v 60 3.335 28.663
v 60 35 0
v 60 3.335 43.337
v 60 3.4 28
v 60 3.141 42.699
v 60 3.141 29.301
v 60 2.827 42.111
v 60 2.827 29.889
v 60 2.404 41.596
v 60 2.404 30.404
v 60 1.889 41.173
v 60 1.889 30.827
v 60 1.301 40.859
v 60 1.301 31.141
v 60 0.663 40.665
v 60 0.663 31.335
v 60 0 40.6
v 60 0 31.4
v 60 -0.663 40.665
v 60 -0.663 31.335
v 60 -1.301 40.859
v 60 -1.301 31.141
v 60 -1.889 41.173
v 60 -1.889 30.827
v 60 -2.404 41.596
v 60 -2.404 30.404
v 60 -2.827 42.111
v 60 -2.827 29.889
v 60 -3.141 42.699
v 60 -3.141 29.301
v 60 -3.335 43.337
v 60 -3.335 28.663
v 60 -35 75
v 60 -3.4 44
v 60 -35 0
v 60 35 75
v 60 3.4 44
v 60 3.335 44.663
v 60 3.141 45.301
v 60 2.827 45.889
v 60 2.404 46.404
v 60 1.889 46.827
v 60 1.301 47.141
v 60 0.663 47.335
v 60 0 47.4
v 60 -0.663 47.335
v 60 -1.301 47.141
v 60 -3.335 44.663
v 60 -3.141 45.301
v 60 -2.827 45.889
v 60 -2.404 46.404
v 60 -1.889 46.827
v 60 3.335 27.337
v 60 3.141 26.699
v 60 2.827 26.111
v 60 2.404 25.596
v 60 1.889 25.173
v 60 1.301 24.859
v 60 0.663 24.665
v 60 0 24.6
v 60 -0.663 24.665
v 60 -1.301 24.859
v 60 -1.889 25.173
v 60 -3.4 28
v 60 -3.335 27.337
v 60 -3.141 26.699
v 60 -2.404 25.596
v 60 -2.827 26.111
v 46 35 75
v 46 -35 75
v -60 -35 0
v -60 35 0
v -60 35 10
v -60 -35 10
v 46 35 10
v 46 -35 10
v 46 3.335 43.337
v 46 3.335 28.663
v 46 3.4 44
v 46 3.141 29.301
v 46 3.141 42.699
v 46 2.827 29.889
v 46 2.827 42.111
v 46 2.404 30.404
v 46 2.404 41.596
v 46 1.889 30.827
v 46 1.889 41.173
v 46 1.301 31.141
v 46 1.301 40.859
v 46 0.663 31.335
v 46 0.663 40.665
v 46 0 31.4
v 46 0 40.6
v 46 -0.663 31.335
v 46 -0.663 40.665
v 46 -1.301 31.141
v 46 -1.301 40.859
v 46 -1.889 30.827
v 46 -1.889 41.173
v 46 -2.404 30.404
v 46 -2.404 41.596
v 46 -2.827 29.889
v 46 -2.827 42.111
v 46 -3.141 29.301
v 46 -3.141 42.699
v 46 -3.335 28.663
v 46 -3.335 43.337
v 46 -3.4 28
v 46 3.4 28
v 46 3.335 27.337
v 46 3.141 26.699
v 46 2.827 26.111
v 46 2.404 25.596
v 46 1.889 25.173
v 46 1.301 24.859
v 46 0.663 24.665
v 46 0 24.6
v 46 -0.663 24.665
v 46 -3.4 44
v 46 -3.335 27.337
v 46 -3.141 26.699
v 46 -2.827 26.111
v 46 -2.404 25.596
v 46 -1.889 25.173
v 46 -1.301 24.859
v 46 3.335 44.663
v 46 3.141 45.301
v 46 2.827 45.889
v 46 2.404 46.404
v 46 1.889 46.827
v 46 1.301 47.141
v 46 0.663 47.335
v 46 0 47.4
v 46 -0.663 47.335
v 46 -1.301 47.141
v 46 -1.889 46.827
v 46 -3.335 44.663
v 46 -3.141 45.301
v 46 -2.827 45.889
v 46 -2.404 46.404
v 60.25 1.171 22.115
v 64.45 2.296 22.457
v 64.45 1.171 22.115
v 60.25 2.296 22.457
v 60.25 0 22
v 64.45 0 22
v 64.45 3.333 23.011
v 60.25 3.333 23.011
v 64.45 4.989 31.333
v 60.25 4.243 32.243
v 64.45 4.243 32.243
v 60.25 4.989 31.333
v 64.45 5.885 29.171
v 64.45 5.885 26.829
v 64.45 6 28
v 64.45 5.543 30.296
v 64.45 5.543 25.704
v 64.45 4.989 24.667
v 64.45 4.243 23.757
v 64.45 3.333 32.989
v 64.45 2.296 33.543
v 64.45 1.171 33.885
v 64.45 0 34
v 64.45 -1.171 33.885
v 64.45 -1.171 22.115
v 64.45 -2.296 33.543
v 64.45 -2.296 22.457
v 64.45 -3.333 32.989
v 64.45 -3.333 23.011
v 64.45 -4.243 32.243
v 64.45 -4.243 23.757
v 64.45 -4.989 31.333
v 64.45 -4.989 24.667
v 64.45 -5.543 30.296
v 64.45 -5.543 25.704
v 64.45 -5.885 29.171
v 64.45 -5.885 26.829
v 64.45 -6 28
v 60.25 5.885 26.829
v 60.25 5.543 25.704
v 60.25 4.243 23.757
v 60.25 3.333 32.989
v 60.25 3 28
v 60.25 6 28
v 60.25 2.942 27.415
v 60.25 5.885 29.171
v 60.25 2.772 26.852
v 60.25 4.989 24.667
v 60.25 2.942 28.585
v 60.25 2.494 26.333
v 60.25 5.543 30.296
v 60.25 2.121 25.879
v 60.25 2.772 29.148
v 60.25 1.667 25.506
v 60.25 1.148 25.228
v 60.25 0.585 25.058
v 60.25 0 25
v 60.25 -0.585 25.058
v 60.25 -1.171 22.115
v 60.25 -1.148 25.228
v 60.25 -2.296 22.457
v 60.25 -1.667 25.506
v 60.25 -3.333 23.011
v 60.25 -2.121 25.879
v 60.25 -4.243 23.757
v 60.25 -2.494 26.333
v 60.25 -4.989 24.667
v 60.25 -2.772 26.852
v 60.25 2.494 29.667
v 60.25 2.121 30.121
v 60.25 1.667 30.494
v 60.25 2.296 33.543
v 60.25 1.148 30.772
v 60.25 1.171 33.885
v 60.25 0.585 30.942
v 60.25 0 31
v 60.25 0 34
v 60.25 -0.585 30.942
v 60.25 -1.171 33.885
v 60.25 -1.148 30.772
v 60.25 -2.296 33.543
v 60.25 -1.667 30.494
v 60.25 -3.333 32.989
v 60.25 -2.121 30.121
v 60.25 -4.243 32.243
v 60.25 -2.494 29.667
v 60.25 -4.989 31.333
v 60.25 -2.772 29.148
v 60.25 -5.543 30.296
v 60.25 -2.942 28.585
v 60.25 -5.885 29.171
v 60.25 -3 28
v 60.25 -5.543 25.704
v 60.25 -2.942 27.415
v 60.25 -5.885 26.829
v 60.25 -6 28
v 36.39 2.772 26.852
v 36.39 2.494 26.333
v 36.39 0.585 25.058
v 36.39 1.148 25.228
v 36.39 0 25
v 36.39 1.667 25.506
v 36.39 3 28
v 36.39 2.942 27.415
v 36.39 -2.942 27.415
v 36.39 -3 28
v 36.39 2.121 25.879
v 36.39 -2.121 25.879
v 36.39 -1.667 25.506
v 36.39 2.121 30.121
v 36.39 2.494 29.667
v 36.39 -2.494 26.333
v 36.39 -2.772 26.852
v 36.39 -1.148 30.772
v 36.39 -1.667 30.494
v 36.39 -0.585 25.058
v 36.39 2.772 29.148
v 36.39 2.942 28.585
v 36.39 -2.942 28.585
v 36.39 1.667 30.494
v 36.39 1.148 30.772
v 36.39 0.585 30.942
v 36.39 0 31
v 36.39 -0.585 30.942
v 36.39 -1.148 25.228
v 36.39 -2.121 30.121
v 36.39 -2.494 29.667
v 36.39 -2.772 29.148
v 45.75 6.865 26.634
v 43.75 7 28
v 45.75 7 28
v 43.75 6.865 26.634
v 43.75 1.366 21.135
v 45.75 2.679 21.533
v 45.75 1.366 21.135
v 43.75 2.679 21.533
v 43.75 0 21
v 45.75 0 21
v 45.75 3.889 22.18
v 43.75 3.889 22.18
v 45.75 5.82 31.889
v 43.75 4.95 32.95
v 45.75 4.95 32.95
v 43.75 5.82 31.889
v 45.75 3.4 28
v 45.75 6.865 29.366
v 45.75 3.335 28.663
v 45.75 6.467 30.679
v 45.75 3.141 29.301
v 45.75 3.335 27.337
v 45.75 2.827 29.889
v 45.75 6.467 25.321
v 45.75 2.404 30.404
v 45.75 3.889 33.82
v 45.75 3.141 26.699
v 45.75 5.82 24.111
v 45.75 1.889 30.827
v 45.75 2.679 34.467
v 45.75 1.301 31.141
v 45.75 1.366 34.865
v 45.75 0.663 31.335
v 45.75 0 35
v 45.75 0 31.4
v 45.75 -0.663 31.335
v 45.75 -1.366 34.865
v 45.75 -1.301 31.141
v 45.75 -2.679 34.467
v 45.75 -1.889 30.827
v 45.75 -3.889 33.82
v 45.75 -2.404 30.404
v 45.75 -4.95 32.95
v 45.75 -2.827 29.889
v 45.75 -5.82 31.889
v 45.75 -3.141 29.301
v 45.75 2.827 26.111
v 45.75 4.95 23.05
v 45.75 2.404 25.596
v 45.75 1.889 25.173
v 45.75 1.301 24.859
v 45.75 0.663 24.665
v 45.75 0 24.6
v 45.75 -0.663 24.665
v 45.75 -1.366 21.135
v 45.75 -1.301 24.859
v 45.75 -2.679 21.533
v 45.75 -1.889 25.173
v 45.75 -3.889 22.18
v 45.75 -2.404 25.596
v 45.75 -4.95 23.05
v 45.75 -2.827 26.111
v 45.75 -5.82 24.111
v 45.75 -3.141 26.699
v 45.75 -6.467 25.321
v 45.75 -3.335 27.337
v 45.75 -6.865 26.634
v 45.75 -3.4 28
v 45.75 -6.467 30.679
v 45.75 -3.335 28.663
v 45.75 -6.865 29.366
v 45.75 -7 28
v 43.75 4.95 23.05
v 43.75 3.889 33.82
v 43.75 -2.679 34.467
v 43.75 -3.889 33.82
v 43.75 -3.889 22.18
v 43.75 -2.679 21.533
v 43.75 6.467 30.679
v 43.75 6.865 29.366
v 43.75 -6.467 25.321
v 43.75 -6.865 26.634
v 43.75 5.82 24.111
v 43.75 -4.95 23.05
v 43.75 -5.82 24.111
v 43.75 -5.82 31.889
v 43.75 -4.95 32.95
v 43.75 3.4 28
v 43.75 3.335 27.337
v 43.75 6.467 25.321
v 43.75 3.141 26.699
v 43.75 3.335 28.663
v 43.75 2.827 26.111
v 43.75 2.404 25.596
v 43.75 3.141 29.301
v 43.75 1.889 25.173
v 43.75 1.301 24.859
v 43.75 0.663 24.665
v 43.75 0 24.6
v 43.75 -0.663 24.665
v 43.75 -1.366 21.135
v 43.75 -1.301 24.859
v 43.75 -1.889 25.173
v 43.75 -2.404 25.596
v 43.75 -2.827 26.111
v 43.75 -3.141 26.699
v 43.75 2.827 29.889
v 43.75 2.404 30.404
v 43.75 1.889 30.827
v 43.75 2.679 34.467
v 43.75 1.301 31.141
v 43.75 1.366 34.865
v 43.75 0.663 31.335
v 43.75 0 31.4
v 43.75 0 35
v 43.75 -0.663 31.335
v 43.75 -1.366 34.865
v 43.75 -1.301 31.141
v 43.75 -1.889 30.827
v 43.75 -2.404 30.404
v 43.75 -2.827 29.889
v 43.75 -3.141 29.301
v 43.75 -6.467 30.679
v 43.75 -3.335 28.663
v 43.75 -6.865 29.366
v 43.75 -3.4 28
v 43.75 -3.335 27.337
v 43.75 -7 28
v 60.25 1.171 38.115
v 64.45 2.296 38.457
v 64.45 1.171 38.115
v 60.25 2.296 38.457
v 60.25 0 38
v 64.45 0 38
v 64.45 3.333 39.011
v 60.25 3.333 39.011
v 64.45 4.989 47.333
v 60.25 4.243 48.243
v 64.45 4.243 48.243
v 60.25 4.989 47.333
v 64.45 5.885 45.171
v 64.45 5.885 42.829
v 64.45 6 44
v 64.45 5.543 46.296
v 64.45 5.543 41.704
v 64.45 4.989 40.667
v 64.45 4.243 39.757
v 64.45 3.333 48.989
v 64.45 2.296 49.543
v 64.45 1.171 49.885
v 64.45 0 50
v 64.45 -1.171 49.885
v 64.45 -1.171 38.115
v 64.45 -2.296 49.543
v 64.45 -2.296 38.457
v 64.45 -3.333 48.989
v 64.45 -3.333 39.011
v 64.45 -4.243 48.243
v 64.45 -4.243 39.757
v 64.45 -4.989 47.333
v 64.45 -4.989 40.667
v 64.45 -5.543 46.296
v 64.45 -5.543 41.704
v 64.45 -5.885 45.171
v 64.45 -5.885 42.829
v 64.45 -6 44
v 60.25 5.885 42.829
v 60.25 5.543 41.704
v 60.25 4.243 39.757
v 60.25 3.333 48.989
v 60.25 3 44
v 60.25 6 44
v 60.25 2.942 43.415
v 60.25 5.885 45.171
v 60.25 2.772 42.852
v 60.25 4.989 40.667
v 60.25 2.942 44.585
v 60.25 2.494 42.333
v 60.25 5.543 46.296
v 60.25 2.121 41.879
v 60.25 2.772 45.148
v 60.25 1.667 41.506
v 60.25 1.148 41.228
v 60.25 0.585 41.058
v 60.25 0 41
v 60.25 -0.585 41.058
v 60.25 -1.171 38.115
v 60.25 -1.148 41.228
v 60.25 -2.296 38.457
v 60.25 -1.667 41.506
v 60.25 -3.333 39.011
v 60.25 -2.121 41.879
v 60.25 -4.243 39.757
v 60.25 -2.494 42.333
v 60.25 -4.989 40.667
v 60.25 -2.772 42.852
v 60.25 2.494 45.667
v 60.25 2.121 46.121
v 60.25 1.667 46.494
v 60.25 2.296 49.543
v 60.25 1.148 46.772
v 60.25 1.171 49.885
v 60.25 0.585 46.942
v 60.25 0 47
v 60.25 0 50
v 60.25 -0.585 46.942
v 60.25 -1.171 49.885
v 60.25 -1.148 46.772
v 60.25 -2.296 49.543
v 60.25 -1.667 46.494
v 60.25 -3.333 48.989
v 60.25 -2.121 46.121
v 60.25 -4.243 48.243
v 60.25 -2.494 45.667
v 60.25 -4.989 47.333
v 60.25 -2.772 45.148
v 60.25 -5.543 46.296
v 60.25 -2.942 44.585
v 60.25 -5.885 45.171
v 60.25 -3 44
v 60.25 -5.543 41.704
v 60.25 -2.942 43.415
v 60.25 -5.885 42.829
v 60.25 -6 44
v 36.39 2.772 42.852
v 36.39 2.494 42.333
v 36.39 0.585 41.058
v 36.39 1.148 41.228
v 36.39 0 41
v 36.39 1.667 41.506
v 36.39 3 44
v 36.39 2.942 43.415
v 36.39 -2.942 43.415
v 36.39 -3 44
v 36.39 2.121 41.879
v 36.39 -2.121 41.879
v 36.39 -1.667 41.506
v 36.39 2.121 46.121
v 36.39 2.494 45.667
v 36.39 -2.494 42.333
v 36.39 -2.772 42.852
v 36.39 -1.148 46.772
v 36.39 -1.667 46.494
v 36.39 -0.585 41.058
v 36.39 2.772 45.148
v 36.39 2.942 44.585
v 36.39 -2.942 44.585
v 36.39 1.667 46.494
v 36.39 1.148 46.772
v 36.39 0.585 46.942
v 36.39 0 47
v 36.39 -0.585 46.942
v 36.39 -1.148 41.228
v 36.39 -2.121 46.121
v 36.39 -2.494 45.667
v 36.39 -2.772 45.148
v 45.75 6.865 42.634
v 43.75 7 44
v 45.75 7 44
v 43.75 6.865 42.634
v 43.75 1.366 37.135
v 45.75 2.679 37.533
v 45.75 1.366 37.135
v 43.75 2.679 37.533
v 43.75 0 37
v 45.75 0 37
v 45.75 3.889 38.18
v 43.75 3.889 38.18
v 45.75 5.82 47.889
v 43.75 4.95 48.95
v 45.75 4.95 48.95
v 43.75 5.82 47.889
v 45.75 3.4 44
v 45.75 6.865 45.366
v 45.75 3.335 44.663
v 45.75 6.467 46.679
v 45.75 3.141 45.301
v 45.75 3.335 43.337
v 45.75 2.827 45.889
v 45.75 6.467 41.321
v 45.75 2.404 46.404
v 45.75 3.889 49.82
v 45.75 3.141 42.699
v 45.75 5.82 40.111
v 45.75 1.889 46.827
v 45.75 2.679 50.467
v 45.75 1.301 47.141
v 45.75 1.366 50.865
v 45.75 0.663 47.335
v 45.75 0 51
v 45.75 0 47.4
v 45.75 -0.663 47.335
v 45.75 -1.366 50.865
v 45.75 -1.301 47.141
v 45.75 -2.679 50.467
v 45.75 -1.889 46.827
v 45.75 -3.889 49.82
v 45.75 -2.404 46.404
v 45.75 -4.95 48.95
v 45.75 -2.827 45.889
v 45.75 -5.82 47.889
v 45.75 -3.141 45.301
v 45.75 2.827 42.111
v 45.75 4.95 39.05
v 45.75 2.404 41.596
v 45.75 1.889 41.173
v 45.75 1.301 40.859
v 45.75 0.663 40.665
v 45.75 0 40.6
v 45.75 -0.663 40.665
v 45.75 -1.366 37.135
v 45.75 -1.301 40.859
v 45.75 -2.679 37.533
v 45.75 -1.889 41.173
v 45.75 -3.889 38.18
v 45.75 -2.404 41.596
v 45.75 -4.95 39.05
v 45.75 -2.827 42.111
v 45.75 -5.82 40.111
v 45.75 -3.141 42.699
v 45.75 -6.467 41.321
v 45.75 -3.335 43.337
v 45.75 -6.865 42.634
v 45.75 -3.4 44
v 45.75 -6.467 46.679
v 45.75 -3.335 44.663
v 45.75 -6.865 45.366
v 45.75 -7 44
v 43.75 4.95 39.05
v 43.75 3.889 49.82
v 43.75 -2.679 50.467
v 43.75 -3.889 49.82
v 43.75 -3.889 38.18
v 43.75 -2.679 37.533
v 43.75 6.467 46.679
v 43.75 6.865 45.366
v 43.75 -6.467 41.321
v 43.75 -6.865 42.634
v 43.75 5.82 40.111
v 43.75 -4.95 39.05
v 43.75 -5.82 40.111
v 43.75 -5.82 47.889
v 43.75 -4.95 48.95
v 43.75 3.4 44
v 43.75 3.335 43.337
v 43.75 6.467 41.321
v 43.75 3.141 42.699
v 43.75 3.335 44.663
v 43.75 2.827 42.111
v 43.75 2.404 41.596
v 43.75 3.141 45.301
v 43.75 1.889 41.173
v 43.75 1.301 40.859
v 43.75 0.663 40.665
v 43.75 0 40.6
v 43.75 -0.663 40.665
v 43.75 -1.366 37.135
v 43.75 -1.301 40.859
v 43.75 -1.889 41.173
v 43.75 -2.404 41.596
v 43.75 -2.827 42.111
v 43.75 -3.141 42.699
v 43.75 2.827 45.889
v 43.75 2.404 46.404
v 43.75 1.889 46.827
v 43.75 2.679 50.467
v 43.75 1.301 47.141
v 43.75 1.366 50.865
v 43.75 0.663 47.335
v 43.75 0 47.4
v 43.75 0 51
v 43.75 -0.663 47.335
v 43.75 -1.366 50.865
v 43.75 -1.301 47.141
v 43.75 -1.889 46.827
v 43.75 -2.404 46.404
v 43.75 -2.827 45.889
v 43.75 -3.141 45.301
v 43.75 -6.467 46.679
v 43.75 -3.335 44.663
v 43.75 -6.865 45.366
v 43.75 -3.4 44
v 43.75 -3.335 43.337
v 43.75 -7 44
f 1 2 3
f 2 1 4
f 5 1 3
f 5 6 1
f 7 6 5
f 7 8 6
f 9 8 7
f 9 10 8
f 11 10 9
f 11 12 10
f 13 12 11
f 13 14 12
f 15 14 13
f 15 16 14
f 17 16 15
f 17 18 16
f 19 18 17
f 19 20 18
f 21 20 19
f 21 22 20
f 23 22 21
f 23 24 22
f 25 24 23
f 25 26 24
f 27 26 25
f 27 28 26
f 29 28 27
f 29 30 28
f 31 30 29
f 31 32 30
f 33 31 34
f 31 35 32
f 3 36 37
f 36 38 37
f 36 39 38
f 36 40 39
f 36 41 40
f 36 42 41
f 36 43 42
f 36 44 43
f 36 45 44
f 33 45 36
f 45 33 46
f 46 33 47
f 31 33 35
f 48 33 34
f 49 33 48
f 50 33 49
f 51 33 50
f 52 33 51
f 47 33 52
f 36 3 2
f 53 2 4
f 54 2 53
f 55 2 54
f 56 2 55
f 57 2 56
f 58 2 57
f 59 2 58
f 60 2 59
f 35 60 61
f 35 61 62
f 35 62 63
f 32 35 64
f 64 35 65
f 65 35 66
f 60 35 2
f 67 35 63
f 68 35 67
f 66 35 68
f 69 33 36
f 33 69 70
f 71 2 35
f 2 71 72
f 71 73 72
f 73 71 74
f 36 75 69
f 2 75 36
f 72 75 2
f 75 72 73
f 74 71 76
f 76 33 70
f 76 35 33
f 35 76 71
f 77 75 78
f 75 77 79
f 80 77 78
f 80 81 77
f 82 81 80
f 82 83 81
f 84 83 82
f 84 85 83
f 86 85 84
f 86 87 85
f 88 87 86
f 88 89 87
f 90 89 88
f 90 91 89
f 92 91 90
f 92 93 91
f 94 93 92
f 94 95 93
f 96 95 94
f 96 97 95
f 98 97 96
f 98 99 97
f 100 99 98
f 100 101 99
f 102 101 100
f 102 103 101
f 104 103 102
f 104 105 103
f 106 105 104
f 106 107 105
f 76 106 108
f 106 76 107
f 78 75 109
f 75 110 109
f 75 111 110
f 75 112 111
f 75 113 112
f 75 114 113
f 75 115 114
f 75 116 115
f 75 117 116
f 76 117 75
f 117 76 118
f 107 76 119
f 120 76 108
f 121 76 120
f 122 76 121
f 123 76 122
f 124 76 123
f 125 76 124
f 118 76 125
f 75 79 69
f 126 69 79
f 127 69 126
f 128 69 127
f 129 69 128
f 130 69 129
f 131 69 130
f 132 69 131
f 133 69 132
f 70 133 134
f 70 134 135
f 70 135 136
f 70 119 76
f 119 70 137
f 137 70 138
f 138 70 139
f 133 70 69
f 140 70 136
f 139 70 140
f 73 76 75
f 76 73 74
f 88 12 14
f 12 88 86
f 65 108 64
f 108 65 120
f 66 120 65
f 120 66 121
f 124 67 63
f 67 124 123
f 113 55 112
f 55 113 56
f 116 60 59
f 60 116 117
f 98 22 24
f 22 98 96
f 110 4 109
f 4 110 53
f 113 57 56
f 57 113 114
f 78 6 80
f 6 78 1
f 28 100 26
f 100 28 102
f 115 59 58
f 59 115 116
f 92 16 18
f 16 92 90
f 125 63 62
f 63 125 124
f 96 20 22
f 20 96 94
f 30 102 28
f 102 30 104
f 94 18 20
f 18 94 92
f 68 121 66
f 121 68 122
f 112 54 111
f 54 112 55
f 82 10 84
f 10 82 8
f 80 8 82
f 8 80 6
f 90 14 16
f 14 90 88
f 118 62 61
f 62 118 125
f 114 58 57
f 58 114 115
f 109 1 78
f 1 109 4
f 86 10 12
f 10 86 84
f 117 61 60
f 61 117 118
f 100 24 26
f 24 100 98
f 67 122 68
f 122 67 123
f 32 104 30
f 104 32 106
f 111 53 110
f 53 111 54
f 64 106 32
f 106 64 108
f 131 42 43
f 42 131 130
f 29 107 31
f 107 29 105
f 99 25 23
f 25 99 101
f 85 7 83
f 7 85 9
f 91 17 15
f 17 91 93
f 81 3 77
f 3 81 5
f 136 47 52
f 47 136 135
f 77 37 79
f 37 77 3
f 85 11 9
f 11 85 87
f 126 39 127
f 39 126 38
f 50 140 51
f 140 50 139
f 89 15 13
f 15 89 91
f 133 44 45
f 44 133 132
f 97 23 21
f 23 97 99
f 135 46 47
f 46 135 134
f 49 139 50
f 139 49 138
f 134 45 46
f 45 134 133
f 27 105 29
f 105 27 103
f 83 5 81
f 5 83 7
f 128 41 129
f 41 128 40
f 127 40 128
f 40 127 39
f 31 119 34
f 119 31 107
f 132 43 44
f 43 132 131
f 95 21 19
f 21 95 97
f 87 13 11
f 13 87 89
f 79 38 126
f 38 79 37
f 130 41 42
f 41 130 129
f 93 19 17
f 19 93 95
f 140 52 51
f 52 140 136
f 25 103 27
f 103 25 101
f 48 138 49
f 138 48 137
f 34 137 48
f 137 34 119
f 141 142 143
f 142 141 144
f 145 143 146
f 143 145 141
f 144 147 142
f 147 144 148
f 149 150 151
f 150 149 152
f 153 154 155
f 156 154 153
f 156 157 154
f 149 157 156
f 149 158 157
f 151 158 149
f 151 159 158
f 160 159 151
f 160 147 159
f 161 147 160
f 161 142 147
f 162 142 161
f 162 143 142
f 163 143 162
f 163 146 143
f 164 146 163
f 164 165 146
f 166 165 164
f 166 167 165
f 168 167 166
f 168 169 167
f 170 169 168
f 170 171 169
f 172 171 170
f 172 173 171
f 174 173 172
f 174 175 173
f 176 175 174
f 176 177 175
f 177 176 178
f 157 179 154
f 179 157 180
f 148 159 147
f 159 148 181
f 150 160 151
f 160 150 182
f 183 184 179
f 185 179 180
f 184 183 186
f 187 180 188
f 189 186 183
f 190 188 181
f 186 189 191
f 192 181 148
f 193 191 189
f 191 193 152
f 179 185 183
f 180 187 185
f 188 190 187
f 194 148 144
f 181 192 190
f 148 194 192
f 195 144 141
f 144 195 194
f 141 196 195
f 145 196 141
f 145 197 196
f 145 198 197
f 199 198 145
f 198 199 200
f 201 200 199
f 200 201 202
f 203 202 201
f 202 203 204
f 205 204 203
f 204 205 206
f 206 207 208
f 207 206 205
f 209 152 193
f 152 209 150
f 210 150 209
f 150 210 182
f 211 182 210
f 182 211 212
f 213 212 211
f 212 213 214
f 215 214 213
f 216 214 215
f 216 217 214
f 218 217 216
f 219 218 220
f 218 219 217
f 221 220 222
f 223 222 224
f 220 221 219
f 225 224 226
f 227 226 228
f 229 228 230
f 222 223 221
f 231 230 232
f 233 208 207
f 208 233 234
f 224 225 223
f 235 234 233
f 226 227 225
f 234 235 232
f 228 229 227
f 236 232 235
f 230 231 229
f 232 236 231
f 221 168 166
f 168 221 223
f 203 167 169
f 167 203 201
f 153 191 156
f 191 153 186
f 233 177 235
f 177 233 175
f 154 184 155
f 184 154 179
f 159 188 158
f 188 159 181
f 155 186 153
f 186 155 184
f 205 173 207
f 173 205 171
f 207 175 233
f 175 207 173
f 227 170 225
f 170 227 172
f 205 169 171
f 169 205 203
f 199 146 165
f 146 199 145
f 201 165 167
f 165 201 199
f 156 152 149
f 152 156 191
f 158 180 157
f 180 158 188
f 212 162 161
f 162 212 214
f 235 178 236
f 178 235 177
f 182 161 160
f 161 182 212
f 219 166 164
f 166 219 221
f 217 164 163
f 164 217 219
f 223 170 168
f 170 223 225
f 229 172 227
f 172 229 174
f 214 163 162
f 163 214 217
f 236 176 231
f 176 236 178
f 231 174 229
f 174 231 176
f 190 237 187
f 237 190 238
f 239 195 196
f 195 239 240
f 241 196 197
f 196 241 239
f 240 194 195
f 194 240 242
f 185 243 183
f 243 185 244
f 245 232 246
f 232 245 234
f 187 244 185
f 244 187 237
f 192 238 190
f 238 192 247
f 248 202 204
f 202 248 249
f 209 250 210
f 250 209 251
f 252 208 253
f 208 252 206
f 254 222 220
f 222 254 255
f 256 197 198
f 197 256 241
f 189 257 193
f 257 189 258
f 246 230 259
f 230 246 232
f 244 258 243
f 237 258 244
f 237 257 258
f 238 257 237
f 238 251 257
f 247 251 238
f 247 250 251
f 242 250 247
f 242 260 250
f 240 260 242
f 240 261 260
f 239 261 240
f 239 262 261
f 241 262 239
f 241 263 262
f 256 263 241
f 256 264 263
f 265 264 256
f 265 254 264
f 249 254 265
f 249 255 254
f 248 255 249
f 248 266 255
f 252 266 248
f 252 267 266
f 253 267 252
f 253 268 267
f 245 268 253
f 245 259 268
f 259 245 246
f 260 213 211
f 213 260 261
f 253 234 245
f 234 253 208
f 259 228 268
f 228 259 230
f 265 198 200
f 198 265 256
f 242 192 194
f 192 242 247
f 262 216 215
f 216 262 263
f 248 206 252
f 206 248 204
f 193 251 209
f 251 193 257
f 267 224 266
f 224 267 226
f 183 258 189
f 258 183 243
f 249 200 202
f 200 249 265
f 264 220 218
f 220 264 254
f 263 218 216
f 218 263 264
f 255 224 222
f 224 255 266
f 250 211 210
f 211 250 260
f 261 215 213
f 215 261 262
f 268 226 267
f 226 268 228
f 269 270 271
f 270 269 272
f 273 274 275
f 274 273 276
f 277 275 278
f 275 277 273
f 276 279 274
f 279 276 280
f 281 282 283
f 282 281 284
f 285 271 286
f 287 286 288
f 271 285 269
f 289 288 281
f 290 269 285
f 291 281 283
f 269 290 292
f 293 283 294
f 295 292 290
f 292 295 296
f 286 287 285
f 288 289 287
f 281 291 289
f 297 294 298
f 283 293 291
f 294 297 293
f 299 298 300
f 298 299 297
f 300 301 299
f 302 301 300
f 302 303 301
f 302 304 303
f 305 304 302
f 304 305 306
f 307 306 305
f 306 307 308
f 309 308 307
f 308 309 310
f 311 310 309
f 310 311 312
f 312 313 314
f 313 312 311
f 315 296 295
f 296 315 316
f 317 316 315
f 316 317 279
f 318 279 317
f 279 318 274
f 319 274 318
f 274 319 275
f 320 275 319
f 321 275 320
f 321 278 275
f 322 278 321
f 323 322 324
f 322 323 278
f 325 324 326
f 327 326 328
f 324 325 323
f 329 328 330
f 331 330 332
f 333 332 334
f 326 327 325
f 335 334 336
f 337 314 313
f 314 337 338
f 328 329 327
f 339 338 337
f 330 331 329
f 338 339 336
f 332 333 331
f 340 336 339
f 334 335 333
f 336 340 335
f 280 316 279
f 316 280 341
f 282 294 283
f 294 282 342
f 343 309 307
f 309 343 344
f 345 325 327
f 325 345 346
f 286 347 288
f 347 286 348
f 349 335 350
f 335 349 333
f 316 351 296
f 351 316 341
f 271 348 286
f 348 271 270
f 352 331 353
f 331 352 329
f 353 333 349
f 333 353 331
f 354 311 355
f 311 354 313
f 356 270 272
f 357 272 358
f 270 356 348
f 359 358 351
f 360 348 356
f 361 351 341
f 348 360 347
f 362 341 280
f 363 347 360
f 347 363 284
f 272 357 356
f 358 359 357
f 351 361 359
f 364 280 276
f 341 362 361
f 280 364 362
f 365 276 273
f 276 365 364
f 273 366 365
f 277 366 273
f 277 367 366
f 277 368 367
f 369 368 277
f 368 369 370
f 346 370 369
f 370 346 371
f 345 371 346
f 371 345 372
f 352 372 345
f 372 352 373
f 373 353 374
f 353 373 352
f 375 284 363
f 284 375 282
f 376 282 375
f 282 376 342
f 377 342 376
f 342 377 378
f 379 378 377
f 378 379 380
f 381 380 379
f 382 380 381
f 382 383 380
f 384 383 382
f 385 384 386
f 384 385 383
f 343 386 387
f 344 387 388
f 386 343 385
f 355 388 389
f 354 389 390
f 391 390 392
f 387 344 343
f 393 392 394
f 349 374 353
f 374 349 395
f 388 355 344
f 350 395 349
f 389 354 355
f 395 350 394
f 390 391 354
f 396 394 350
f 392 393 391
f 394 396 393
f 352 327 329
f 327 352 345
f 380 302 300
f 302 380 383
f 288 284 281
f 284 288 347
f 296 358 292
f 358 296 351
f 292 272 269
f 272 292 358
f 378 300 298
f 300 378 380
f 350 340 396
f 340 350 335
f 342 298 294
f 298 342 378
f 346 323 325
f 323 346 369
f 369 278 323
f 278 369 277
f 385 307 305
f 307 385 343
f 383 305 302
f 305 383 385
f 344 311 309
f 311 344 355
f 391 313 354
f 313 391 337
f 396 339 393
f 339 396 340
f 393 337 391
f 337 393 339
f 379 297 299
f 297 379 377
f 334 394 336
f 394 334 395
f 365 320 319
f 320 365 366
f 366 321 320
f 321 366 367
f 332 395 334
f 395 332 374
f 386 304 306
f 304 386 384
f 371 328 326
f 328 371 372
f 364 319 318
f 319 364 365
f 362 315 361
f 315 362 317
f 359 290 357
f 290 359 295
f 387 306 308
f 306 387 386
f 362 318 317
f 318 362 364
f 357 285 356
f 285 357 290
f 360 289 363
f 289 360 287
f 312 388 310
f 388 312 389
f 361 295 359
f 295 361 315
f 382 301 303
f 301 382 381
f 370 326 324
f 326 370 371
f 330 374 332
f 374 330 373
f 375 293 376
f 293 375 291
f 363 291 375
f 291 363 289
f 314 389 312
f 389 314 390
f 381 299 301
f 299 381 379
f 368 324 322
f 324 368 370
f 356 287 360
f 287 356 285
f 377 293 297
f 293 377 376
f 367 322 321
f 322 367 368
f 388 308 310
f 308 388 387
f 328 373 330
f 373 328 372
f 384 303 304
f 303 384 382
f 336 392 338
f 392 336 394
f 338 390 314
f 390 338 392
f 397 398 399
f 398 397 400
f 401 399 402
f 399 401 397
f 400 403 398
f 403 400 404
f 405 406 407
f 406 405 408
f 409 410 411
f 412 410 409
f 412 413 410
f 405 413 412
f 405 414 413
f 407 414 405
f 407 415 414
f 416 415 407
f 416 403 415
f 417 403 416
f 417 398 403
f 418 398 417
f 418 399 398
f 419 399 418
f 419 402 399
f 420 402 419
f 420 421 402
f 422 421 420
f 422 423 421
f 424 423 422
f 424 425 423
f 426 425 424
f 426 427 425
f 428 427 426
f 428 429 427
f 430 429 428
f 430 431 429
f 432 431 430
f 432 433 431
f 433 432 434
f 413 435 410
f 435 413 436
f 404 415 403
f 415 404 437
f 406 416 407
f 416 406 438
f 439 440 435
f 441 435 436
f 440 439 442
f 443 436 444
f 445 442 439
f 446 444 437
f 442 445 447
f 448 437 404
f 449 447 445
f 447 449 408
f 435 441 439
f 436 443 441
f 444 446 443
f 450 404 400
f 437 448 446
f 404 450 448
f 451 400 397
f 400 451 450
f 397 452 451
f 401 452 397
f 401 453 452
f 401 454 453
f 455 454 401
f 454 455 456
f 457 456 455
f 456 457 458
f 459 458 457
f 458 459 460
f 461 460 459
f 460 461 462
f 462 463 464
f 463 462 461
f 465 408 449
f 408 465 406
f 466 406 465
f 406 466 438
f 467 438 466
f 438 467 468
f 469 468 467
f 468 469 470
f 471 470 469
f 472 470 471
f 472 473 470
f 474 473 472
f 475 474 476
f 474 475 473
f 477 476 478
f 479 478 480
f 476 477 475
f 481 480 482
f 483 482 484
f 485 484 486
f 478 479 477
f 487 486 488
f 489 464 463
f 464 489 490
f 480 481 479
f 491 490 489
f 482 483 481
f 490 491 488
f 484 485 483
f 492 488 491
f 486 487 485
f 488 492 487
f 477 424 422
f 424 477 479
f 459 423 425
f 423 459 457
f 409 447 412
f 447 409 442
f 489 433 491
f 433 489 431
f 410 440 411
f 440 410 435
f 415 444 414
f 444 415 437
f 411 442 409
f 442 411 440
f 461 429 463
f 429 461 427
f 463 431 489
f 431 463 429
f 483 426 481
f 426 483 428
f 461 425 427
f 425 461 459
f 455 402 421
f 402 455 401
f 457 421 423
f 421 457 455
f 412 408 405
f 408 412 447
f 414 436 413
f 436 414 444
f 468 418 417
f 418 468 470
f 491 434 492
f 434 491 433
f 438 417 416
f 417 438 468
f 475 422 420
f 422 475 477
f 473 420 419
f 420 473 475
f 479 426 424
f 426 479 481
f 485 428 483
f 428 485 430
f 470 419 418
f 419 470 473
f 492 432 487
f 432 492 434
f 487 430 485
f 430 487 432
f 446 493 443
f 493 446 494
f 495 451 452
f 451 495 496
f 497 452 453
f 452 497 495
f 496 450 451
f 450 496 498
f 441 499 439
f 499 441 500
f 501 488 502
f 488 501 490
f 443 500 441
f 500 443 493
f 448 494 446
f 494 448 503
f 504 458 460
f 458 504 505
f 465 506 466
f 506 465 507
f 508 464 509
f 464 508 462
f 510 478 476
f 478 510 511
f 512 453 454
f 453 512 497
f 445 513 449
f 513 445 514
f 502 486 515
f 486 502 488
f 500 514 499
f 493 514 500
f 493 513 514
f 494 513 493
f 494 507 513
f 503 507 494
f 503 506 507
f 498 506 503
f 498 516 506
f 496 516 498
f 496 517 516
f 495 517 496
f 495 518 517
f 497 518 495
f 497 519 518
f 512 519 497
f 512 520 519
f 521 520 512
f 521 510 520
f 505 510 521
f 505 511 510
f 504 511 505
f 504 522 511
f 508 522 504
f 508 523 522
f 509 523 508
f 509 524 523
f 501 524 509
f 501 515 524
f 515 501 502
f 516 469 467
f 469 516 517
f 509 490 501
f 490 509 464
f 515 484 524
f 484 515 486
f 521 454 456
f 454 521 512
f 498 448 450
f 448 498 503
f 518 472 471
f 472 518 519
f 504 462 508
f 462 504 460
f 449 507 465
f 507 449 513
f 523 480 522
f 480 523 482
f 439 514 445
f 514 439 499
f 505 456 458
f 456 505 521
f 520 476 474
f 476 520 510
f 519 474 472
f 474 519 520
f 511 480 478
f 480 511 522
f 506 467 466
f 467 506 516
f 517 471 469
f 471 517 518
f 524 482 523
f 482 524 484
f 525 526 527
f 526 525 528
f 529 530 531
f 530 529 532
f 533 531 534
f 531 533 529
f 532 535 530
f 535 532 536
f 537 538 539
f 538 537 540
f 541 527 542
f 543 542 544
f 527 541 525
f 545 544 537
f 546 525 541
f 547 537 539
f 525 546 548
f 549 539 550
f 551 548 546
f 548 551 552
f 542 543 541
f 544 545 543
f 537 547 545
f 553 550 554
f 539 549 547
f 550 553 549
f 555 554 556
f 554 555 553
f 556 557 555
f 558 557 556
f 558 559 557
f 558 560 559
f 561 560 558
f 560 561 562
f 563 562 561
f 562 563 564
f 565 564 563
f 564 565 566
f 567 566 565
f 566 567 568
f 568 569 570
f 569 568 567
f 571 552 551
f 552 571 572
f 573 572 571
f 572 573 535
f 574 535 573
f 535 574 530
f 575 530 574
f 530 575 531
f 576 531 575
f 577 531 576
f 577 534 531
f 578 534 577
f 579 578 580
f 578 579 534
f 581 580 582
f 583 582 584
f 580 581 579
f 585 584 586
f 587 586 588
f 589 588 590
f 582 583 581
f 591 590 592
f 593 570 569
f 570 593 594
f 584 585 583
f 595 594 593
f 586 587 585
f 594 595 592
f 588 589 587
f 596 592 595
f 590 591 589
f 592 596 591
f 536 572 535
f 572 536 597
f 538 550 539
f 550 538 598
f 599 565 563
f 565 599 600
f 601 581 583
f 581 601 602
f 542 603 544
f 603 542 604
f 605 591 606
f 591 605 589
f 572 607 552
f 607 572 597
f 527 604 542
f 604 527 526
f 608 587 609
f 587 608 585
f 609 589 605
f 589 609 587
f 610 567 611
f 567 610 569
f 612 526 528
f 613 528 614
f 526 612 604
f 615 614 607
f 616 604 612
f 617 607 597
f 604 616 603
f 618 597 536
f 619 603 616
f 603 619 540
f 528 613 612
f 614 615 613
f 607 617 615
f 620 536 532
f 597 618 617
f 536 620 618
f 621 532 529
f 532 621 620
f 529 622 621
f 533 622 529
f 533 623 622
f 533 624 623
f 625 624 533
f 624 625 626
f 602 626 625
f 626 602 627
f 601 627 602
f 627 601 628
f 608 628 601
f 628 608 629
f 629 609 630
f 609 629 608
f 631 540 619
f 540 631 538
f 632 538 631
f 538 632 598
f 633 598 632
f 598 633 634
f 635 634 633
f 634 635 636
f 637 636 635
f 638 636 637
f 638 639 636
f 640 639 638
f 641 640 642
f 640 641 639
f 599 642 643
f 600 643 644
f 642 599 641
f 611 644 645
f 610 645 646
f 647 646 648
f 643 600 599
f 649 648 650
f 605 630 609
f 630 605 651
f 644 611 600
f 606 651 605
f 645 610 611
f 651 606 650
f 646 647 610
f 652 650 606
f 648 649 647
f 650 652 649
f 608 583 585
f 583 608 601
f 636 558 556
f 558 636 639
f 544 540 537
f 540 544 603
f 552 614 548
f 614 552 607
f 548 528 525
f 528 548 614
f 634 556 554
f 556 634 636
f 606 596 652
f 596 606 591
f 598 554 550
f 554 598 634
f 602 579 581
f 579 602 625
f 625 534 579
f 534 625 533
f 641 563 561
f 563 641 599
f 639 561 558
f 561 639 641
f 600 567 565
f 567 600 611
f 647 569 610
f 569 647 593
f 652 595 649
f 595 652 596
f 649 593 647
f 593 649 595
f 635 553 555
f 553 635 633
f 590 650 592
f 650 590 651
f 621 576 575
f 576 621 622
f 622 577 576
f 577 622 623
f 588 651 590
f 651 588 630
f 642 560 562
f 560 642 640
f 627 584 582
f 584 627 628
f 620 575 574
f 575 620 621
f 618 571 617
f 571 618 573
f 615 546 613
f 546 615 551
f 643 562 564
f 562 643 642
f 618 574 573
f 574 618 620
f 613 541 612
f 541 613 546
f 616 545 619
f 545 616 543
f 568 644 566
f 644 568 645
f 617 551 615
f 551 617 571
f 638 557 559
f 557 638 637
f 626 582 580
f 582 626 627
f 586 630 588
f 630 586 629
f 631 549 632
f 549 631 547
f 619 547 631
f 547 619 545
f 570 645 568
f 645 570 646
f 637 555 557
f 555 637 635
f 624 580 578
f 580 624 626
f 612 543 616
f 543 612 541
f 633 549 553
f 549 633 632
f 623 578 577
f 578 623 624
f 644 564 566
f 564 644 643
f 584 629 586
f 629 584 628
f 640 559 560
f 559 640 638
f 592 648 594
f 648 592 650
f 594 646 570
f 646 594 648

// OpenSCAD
$fn = 32;

// ------------------------------------------------------------------------
// Bolted bracket: 120 x 70 mm bracket with 2 bolt joints
// Every part is its own module, assembly() places them once.
// ------------------------------------------------------------------------

// --- part 1 ---
module bracket() {
  difference() {
    translate([-60, -35, 0]) cube([120, 70, 75]);
    translate([-61, -36, 10]) cube([107, 72, 66]);
    translate([53, 0, 28]) rotate([0, 90, 0]) cylinder(h = 16, d = 6.8, center = true);
    translate([53, 0, 44]) rotate([0, 90, 0]) cylinder(h = 16, d = 6.8, center = true);
  }
}

// --- part 2 ---
module bolt1() {
  cylinder(h = 4.2, d = 12);
  translate([0, 0, -23.86]) cylinder(h = 23.86, d = 6);
}

// --- part 3 ---
module washer1() {
  difference() {
      translate([0, 0, 0]) cylinder(h = 2, d = 14);
      translate([0, 0, -1]) cylinder(h = 4, d = 6.8);
    }
}

// --- part 4 ---
module bolt2() {
  cylinder(h = 4.2, d = 12);
  translate([0, 0, -23.86]) cylinder(h = 23.86, d = 6);
}

// --- part 5 ---
module washer2() {
  difference() {
      translate([0, 0, 0]) cylinder(h = 2, d = 14);
      translate([0, 0, -1]) cylinder(h = 4, d = 6.8);
    }
}

// --- assembly ---
module assembly() {
  translate([0, 0, 0]) rotate([0, 0, 0]) bracket();
  translate([60.25, 0, 28]) rotate([0, 90, 0]) bolt1();
  translate([43.75, 0, 28]) rotate([0, 90, 0]) washer1();
  translate([60.25, 0, 44]) rotate([0, 90, 0]) bolt2();
  translate([43.75, 0, 44]) rotate([0, 90, 0]) washer2();
}

assembly();
